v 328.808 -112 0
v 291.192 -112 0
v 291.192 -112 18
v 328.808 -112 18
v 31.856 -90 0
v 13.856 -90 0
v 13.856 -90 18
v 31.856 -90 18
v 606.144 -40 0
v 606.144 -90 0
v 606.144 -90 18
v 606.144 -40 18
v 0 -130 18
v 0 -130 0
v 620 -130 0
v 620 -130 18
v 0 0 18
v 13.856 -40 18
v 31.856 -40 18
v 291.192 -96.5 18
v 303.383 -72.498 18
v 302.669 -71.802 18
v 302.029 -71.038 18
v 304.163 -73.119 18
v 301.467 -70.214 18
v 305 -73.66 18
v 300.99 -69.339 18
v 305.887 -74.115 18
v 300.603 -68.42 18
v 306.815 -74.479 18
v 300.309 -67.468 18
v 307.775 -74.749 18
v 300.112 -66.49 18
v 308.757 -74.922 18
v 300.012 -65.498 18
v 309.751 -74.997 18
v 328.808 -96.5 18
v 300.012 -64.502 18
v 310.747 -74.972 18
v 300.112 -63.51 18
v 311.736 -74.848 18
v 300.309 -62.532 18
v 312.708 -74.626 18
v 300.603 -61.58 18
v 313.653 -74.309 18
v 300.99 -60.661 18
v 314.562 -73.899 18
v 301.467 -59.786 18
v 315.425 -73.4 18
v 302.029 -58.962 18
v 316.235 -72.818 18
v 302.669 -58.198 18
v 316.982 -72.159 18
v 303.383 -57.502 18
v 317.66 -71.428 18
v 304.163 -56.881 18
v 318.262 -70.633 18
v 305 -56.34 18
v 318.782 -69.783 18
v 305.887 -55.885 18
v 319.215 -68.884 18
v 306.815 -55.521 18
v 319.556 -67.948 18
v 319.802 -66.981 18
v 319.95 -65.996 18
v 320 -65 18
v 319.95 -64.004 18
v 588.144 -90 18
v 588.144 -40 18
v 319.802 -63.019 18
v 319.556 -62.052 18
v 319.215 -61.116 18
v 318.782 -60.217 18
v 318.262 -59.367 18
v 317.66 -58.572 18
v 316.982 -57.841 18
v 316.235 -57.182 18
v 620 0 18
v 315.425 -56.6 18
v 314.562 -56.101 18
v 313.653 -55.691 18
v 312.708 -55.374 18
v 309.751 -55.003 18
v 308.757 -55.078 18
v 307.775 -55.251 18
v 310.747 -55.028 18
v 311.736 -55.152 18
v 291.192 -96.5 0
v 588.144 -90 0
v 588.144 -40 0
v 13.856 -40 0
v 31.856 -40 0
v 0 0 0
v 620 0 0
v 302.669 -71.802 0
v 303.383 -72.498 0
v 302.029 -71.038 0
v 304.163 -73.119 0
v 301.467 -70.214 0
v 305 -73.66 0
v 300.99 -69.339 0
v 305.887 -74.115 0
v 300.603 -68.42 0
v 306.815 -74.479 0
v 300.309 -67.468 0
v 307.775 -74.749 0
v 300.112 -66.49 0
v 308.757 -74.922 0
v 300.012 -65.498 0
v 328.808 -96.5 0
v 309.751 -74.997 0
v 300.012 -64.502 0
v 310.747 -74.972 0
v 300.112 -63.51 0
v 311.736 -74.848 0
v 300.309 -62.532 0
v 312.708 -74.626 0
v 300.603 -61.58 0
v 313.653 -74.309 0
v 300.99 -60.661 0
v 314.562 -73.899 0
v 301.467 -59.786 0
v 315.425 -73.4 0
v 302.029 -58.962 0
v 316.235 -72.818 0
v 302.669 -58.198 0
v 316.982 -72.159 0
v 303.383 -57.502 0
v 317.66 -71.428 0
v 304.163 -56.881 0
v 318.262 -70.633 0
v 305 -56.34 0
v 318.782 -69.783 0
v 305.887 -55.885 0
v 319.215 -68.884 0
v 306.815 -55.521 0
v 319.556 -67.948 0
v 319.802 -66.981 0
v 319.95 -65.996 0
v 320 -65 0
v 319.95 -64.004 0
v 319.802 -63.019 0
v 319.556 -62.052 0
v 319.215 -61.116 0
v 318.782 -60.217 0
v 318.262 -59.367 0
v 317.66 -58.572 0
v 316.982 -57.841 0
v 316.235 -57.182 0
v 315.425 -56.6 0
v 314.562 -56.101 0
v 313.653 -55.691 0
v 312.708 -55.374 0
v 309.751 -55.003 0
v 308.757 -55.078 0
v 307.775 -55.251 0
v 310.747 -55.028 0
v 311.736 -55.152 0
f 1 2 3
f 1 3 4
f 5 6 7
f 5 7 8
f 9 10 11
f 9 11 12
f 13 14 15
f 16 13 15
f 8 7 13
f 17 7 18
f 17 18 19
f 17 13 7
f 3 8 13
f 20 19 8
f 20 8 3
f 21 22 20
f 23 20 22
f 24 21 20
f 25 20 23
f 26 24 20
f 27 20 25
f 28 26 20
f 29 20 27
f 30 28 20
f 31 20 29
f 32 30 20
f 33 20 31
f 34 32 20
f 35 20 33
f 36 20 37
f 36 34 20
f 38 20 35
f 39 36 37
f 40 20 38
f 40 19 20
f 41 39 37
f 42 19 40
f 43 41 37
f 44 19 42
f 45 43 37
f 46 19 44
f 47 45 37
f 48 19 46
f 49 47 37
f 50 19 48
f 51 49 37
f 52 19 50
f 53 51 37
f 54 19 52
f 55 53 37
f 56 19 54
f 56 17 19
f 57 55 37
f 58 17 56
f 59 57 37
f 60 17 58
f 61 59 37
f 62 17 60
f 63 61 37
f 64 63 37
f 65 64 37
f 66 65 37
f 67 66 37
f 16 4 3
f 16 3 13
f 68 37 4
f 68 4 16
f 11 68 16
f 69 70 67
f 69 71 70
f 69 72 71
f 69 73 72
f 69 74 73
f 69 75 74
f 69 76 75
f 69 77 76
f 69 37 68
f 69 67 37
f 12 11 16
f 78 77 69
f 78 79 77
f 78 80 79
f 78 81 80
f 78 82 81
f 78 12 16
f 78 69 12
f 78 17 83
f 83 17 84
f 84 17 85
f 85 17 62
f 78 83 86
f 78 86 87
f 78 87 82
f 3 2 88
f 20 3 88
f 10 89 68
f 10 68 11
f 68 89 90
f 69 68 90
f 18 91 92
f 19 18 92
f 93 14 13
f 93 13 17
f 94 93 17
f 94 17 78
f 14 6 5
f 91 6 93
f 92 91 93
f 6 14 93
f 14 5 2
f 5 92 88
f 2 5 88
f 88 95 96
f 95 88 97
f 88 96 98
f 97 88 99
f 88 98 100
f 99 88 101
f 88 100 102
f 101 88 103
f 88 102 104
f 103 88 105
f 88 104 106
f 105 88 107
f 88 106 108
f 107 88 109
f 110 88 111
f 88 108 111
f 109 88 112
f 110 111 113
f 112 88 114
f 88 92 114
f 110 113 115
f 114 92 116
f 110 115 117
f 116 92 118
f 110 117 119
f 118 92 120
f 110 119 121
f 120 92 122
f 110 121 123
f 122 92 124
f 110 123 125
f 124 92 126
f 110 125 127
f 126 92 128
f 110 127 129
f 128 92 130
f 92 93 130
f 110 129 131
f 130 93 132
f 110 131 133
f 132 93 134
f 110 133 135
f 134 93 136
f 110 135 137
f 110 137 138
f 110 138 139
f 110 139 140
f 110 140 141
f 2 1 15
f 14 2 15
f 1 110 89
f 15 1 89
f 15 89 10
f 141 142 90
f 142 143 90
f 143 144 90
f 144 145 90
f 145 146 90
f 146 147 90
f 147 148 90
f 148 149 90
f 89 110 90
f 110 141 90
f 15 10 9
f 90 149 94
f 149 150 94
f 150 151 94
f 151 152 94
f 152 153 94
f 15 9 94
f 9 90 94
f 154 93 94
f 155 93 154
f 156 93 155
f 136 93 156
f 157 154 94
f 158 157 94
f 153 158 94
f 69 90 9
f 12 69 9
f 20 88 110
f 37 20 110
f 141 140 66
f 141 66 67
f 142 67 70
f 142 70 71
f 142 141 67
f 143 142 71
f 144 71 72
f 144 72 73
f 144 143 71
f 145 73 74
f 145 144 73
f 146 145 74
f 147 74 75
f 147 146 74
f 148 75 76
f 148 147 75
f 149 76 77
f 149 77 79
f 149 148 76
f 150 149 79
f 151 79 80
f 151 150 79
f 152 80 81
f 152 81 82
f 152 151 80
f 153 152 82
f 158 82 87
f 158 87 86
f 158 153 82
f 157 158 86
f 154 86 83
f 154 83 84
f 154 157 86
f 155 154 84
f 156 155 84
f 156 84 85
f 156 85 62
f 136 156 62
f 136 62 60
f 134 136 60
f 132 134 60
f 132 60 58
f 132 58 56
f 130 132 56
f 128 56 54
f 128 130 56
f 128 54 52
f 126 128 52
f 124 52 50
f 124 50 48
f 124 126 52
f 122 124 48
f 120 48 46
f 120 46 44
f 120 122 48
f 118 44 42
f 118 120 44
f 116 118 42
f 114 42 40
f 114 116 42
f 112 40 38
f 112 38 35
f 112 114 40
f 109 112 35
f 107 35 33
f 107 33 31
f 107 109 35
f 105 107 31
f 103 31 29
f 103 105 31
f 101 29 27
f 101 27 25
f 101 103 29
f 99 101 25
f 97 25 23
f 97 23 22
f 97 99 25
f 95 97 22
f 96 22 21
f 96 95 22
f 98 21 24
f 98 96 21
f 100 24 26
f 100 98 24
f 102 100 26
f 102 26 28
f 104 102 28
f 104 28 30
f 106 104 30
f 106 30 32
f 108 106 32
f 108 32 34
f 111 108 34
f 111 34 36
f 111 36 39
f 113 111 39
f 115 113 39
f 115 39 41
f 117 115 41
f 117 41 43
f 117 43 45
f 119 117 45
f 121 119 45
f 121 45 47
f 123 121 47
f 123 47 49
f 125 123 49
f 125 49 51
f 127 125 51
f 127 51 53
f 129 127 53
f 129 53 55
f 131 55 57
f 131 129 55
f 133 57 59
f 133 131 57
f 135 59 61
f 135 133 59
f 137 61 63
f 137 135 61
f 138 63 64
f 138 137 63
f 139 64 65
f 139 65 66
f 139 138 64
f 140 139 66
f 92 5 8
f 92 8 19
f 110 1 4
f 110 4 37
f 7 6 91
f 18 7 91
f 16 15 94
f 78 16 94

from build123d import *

# Parameters (mm, degrees)
SKETCH1_W           = 620
SKETCH1_H           = 130
SKETCH1_R           = 10
SKETCH1_W_2         = 18
SKETCH1_H_2         = 50
SKETCH1_W_3         = 37.615580966
SKETCH1_H_3         = 15.499548612
BOSS_EXTRUDE1_DEPTH = 18


with BuildPart() as part:
    # Sketch1 → Boss-Extrude1 (new body)
    with BuildSketch(Plane.XY):
        with Locations((310, -65)):
            Rectangle(SKETCH1_W, SKETCH1_H)
        with Locations((310, -65)):
            Circle(SKETCH1_R, mode=Mode.SUBTRACT)
        with Locations((22.856274172, -65)):
            Rectangle(SKETCH1_W_2, SKETCH1_H_2, mode=Mode.SUBTRACT)
        with Locations((310, -104.250225694)):
            Rectangle(SKETCH1_W_3, SKETCH1_H_3, mode=Mode.SUBTRACT)
        with Locations((597.143725828, -65)):
            Rectangle(SKETCH1_W_2, SKETCH1_H_2, mode=Mode.SUBTRACT)
    extrude(amount=BOSS_EXTRUDE1_DEPTH)


solid = part.part
